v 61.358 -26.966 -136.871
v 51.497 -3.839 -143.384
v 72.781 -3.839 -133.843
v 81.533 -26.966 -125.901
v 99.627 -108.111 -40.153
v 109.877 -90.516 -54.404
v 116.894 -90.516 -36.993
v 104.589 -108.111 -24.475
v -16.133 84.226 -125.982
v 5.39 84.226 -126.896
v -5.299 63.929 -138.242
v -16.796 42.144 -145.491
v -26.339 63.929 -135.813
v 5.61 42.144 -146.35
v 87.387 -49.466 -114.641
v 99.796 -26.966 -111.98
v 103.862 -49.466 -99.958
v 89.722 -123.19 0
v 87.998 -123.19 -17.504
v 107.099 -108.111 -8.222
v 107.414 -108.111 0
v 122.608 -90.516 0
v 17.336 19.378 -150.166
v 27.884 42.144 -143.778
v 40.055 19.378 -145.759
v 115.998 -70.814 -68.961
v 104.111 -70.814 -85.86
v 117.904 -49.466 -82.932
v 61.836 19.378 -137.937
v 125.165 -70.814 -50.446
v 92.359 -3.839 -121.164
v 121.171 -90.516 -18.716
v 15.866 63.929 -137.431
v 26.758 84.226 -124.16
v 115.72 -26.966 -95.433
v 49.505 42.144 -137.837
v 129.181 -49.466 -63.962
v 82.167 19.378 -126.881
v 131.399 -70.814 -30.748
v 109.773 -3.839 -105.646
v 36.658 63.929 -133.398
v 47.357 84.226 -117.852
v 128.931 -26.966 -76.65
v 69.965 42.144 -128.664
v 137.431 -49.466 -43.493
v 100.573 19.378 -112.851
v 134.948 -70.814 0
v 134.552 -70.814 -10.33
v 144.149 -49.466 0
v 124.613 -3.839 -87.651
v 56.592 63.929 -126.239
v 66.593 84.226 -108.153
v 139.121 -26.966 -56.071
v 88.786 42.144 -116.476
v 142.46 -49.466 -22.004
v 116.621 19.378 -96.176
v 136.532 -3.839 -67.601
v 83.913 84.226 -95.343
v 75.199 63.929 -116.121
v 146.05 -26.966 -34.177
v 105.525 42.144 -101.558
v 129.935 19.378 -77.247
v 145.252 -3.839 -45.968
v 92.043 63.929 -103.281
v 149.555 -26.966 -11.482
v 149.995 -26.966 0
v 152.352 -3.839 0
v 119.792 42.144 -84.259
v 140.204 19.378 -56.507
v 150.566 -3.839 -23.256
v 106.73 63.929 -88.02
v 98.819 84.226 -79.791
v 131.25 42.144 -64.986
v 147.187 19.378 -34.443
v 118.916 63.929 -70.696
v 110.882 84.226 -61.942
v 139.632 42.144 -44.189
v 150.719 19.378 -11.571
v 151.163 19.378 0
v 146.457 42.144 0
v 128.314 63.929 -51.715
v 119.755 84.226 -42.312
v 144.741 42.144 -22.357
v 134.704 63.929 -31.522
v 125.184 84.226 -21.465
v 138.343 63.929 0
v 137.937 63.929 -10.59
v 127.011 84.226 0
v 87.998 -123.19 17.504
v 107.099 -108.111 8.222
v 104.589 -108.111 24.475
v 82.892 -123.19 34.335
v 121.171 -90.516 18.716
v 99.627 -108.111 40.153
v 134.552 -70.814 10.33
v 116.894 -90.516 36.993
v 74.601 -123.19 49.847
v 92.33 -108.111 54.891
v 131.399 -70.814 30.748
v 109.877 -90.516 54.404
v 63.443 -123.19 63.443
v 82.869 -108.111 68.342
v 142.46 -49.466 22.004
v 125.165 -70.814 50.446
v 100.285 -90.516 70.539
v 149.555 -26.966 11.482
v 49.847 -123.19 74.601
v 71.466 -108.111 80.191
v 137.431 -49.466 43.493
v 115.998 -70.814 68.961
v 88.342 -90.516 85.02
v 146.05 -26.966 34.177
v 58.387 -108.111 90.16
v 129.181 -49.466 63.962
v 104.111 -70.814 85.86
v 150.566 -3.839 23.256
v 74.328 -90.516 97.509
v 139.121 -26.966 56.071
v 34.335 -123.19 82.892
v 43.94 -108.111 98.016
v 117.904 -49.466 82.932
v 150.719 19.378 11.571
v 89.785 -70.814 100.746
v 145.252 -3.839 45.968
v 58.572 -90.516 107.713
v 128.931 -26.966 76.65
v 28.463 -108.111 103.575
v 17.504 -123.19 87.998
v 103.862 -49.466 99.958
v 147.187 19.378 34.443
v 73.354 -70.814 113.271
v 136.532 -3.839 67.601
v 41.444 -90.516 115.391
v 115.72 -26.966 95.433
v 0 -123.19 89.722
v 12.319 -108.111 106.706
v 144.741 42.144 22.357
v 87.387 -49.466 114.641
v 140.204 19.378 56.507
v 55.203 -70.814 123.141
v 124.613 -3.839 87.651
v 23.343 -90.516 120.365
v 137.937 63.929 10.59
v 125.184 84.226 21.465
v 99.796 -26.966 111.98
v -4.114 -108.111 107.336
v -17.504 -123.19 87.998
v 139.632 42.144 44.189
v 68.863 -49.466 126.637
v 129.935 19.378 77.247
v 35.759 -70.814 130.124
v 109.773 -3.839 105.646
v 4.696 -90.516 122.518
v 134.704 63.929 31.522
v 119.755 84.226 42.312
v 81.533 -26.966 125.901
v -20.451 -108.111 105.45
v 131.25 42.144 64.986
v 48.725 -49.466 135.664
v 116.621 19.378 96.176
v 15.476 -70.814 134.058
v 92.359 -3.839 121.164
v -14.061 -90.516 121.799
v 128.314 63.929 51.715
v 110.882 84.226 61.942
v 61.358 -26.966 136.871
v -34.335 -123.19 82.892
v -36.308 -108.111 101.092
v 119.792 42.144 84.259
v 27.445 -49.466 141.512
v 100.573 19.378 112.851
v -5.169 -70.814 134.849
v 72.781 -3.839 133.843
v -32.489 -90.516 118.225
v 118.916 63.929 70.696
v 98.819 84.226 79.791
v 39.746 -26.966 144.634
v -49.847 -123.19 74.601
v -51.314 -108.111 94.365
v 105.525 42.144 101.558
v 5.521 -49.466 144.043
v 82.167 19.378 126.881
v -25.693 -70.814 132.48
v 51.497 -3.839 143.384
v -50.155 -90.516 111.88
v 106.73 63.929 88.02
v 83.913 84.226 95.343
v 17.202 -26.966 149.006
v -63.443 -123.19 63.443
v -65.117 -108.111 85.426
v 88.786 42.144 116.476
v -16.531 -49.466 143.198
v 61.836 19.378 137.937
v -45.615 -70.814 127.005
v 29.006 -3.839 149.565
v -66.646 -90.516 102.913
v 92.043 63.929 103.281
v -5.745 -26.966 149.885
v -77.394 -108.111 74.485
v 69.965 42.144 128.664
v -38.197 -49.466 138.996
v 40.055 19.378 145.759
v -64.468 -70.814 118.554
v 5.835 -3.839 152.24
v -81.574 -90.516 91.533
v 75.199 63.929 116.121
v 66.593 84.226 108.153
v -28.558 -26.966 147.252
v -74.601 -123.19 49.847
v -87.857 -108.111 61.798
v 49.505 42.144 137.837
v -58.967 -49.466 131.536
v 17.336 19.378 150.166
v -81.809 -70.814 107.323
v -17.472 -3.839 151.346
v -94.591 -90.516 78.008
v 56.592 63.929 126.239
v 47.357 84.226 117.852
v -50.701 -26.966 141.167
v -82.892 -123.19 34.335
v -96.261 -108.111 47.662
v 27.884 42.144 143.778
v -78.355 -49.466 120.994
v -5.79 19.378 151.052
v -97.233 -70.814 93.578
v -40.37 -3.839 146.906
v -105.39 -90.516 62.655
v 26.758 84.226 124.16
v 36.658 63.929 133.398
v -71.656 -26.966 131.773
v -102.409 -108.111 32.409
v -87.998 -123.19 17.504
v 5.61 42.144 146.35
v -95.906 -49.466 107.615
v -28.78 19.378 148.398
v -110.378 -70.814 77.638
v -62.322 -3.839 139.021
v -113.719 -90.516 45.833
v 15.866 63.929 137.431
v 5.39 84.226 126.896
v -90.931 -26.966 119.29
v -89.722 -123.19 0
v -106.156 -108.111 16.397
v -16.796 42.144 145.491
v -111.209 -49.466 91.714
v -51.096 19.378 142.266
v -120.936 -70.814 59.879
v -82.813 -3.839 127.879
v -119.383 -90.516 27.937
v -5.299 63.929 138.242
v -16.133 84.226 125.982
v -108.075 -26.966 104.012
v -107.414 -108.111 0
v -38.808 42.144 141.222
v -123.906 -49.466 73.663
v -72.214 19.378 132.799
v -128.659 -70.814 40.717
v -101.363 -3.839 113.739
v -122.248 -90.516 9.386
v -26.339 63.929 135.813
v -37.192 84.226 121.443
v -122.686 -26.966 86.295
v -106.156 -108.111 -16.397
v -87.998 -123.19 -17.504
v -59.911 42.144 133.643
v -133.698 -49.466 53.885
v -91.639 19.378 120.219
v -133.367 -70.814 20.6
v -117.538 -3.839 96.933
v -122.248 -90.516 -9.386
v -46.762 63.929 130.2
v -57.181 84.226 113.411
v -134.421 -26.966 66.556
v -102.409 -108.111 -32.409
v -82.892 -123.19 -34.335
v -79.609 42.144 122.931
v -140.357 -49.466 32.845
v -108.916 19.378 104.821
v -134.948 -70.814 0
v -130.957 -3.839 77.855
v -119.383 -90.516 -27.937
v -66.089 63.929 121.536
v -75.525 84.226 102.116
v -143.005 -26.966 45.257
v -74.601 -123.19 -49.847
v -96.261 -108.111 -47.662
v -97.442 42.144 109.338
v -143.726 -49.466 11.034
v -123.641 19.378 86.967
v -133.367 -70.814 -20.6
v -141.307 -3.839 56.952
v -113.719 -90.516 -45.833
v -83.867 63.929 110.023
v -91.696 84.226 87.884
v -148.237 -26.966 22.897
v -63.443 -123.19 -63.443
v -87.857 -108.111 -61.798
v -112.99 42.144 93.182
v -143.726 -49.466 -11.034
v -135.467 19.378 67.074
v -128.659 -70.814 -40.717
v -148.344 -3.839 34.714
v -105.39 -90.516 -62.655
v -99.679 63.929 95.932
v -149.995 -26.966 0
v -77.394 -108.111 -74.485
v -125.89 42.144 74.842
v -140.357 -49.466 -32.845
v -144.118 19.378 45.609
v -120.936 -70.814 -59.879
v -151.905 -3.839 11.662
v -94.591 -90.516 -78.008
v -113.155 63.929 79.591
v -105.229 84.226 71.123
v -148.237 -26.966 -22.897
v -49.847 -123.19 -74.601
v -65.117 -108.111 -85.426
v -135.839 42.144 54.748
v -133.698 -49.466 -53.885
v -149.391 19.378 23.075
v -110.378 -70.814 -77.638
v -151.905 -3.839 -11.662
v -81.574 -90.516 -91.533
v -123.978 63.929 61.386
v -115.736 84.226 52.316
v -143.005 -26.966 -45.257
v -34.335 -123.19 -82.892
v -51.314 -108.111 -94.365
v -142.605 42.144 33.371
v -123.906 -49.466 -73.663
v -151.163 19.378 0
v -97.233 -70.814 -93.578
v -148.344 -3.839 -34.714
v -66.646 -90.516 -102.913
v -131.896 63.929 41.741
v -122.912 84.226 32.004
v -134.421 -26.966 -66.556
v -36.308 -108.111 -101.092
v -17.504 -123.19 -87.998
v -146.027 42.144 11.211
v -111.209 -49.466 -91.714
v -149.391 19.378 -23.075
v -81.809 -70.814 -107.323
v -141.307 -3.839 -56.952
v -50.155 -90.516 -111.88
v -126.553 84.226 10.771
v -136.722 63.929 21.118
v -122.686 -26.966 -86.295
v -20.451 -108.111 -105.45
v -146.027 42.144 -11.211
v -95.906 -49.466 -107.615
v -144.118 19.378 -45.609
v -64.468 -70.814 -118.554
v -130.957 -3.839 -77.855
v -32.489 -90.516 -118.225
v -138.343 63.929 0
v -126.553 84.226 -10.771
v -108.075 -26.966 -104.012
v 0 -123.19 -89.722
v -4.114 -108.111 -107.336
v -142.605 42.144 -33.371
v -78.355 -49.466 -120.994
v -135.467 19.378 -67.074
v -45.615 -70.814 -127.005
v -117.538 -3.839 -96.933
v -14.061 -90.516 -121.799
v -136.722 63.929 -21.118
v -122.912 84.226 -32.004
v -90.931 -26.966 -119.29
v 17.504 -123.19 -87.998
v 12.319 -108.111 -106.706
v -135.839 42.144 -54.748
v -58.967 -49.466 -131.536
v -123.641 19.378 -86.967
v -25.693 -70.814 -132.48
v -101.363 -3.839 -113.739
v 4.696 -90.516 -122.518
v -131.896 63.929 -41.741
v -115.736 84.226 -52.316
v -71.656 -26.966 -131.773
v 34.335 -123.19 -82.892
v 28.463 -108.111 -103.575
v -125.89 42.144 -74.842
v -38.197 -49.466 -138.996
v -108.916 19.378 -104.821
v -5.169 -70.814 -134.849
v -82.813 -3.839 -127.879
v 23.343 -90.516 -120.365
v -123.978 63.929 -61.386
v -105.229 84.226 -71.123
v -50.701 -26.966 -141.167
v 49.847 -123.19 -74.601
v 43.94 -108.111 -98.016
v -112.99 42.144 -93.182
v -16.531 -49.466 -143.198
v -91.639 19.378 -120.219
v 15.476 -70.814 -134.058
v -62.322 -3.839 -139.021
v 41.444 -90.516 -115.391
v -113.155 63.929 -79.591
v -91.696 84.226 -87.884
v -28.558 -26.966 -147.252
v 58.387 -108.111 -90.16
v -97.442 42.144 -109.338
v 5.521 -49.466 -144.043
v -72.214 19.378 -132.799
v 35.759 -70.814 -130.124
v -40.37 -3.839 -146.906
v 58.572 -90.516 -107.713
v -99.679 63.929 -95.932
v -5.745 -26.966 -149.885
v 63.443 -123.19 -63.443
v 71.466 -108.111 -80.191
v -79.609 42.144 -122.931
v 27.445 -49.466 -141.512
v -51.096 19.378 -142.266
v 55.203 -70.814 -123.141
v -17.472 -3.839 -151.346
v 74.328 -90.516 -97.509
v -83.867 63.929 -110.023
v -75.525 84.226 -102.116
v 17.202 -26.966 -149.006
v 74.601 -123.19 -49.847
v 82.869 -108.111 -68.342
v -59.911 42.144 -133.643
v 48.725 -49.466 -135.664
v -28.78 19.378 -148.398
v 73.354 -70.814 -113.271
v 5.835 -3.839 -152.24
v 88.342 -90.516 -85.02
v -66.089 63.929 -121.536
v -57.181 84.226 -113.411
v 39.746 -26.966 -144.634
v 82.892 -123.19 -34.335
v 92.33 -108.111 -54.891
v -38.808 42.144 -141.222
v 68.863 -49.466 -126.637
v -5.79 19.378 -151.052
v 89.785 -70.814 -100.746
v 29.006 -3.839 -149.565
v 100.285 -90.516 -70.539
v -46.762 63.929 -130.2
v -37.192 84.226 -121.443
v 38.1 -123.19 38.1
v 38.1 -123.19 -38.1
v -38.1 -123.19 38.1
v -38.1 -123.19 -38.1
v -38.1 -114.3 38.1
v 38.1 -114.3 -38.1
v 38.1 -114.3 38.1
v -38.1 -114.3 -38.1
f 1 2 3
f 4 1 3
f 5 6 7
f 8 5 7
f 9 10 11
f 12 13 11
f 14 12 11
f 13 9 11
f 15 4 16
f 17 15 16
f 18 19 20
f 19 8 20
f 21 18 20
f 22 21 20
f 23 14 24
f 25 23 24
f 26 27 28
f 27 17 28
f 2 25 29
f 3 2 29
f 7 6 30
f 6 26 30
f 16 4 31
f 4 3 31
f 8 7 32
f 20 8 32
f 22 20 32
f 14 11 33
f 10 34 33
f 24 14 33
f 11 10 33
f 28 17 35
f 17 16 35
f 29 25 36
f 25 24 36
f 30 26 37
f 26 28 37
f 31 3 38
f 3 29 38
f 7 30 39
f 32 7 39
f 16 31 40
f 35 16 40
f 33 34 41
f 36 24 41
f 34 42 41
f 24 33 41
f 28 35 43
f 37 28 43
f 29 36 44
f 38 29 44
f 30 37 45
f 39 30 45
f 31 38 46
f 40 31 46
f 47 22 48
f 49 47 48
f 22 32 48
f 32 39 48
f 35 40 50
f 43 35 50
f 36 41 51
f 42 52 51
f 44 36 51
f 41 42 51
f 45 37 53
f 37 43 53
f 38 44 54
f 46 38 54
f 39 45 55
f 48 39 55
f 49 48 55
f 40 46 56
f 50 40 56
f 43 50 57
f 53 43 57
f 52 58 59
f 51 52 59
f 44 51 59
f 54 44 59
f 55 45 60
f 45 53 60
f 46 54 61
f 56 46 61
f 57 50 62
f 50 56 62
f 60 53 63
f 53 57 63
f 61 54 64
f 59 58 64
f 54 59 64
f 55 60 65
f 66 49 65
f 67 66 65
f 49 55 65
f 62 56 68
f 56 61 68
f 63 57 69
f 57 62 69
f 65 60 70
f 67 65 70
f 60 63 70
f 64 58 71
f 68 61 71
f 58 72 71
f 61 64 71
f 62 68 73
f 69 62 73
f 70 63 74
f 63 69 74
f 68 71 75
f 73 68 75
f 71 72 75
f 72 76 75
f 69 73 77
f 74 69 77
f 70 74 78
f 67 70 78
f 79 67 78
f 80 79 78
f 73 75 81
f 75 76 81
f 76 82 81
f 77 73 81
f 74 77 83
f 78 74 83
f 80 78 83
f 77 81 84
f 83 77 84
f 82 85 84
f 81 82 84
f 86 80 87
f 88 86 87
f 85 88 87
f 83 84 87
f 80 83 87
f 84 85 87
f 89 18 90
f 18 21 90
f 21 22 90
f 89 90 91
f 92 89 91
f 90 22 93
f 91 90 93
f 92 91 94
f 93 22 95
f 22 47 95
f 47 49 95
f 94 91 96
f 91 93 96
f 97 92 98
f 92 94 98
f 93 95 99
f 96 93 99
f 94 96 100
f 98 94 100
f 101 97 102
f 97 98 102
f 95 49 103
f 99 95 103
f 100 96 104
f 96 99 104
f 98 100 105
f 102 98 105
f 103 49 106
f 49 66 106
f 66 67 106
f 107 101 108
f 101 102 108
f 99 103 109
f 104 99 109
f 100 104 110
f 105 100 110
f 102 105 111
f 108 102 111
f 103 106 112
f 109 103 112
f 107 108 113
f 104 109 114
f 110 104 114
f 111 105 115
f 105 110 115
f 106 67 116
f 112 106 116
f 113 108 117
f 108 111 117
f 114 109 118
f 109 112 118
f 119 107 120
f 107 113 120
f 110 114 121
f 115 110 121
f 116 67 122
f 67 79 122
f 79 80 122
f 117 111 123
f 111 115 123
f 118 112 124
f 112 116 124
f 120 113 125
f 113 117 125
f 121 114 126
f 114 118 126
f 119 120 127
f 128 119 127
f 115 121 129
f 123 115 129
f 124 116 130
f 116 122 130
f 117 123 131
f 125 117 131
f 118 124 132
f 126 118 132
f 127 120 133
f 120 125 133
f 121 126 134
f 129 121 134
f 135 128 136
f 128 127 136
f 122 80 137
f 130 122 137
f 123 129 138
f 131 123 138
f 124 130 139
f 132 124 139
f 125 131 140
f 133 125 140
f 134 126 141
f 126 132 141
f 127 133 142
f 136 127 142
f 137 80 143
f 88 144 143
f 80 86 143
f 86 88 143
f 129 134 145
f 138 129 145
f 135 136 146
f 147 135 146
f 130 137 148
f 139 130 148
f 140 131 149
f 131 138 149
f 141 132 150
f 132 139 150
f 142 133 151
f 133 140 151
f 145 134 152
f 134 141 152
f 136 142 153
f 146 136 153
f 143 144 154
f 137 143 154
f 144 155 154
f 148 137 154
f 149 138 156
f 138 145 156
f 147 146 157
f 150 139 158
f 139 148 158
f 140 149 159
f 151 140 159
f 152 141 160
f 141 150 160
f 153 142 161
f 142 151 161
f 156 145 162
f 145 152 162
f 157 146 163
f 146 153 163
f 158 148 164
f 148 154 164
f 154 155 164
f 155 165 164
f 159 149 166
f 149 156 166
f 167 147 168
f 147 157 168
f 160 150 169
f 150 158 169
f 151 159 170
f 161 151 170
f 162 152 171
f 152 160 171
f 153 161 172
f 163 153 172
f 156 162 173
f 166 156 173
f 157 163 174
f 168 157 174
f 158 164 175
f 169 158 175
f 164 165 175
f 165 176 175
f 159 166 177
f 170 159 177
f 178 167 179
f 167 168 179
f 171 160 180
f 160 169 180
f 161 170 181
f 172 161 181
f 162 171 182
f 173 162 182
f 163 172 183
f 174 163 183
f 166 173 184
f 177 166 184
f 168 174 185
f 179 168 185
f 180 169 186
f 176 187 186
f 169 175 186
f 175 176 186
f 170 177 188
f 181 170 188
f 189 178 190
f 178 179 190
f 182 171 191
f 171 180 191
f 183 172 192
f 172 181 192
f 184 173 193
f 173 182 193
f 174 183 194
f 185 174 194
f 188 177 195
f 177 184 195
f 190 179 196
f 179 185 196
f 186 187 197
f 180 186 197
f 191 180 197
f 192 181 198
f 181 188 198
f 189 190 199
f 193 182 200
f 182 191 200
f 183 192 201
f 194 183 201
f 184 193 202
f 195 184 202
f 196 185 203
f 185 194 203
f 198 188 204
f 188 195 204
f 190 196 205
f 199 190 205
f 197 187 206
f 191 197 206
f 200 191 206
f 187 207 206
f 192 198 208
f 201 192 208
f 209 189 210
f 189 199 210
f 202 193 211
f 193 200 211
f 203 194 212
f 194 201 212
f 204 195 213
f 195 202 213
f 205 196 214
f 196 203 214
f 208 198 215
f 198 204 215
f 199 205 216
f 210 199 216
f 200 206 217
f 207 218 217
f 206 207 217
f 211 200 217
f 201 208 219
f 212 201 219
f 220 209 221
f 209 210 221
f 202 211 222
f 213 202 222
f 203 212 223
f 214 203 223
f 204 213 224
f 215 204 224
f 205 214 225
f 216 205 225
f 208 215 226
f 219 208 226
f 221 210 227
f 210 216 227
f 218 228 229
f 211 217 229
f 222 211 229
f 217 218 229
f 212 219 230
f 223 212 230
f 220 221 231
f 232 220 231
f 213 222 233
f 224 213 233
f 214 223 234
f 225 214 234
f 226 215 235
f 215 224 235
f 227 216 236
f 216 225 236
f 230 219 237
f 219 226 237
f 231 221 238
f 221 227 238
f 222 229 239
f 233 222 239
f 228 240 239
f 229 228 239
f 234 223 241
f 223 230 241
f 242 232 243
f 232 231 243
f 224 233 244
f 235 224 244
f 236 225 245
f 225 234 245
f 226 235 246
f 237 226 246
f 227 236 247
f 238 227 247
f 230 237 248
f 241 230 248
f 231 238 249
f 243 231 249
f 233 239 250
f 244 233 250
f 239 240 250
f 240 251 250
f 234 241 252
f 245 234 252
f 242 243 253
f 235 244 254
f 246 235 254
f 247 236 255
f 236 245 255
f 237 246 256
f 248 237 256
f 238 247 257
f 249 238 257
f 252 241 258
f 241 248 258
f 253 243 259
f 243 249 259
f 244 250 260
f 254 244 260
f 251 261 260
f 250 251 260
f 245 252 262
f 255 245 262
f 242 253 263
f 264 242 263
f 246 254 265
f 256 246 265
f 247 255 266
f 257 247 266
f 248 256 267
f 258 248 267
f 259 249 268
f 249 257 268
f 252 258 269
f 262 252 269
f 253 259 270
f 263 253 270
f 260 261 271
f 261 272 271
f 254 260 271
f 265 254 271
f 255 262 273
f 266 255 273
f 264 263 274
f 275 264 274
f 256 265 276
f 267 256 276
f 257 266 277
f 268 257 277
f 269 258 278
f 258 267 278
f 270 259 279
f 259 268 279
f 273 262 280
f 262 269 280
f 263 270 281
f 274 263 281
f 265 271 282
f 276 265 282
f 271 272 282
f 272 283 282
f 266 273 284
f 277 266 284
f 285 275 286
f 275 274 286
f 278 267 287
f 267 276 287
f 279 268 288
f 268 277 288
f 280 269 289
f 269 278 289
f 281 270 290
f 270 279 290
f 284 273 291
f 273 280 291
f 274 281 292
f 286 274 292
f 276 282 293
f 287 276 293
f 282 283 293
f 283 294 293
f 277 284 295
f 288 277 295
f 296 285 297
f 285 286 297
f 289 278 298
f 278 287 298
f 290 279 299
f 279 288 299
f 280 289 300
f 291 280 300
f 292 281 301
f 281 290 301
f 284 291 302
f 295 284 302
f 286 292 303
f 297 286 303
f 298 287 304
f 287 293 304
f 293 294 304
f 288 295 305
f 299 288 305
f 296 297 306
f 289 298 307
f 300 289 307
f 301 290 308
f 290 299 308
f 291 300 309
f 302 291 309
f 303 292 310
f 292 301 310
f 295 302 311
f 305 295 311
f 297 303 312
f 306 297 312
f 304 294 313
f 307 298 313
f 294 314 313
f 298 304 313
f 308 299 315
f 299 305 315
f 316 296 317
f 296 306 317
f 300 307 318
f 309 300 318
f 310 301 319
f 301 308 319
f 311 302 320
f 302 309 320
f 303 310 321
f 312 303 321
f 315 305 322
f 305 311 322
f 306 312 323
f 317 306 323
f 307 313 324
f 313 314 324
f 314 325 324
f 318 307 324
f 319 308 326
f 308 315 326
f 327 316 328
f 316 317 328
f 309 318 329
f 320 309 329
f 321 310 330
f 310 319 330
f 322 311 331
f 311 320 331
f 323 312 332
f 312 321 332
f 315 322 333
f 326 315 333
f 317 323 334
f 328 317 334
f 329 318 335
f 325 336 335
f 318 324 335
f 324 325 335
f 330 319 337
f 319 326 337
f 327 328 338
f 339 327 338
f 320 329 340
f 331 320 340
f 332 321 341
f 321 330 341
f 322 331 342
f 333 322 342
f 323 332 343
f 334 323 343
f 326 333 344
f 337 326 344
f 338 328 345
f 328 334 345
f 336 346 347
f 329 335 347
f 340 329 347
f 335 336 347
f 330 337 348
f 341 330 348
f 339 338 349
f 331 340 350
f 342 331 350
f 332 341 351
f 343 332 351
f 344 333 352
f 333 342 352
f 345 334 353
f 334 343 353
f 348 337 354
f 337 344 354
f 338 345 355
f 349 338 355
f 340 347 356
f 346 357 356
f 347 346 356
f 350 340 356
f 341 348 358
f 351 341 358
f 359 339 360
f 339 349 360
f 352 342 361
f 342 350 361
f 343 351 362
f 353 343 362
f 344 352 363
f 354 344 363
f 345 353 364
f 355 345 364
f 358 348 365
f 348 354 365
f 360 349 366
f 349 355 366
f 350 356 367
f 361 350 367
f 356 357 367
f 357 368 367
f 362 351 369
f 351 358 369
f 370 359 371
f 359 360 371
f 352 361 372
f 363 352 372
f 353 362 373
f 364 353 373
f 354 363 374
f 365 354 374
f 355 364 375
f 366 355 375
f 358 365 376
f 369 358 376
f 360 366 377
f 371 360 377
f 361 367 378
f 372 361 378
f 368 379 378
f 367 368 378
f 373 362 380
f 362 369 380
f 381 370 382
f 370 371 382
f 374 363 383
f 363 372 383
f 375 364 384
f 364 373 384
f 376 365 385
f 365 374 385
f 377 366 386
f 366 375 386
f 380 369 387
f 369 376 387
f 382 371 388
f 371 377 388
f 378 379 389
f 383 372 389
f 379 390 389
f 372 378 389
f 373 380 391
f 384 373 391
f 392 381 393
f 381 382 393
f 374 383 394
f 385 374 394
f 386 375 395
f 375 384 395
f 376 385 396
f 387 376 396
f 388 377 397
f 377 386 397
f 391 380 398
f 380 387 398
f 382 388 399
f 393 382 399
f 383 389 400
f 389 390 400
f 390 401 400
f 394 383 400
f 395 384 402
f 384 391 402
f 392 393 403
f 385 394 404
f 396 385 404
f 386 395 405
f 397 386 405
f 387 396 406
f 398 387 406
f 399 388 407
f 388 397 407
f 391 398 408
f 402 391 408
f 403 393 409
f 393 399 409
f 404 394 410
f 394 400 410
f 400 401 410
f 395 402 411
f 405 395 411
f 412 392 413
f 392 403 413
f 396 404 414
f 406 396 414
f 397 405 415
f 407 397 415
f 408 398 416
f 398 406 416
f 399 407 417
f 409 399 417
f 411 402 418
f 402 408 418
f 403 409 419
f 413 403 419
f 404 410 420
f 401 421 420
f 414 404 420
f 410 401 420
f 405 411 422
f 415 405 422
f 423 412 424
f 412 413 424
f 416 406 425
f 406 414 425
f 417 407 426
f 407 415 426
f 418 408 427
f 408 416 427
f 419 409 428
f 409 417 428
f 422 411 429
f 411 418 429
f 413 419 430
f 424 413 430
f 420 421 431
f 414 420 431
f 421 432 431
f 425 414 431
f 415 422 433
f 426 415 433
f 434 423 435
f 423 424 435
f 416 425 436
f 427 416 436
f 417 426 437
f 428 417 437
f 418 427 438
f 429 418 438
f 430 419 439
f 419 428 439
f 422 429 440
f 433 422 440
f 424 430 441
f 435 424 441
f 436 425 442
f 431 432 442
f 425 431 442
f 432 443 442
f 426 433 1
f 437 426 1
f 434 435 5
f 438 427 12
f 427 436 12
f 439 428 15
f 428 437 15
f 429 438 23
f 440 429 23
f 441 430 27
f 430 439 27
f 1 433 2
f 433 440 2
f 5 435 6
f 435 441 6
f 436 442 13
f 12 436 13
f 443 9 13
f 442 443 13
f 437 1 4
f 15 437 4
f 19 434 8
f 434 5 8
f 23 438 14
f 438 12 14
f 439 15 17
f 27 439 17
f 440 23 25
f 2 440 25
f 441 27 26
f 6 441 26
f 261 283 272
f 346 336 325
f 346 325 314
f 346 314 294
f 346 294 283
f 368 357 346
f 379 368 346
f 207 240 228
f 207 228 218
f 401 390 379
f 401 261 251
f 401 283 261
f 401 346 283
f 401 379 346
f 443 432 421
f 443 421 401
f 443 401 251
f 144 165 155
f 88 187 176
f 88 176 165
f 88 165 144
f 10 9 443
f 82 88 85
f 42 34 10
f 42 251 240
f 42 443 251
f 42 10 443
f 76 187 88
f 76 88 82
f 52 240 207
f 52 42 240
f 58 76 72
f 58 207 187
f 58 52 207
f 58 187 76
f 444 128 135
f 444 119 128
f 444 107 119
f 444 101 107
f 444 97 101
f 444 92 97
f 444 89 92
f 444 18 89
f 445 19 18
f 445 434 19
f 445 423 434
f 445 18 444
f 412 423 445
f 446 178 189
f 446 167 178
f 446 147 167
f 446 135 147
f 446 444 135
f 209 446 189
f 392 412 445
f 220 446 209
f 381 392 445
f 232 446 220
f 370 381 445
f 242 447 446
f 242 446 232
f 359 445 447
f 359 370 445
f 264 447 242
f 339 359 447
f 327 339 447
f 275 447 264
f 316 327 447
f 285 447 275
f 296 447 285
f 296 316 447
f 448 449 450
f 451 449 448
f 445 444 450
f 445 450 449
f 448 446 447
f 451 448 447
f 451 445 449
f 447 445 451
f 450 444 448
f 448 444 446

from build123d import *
from OCP.BRepAlgoAPI import BRepAlgoAPI_Cut
from OCP.TopTools import TopTools_ListOfShape

# Parameters (mm, degrees)
SKETCH2_W          = 408.49124402
SKETCH2_H          = 323.52250017
CUT_EXTRUDE1_DEPTH = 68.1736
SKETCH3_W          = 76.2
SKETCH3_H          = 76.2
CUT_EXTRUDE2_DEPTH = 38.1
SKETCH5_W          = 393.276963666
SKETCH5_H          = 361.967680156
CUT_EXTRUDE4_DEPTH = 29.21


with BuildPart() as part:
    # Sketch1 → Revolve1 (revolve)
    with BuildSketch(Plane.XY):
        with BuildLine():
            Line((0, 152.4), (0, -152.4))
            ThreePointArc((0, -152.4), (152.4, 0), (0, 152.4))
        make_face()
    revolve(axis=Axis((0, 152.4, 0), (0, -1, 0)))

    # Sketch2 → Cut-Extrude1 (cut)
    with BuildSketch(Plane(origin=(0, 152.4, 0), x_dir=(1, 0, 0), z_dir=(0, 1, 0))):
        Rectangle(SKETCH2_W, SKETCH2_H)
    extrude(amount=-CUT_EXTRUDE1_DEPTH, mode=Mode.SUBTRACT)


with BuildPart() as cut_extrude2_tool:
    # Sketch3 → Cut-Extrude2 (new body)
    with BuildSketch(Plane(origin=(0, -152.4, 0), x_dir=(-1, 0, 0), z_dir=(0, -1, 0))):
        Rectangle(SKETCH3_W, SKETCH3_H)
    extrude(amount=-CUT_EXTRUDE2_DEPTH)


with BuildPart() as part_1:
    add(part.part)

    # Cut-Extrude2: cut by cut_extrude2_tool, with a tolerance
    cut_extrude2_stock = TopTools_ListOfShape()
    cut_extrude2_stock.Append(part_1.part.wrapped)
    cut_extrude2_tools = TopTools_ListOfShape()
    cut_extrude2_tools.Append(cut_extrude2_tool.part.wrapped)
    cut_extrude2_cut = BRepAlgoAPI_Cut()
    cut_extrude2_cut.SetArguments(cut_extrude2_stock)
    cut_extrude2_cut.SetTools(cut_extrude2_tools)
    cut_extrude2_cut.SetFuzzyValue(0.00001)
    cut_extrude2_cut.Build()
    add(Compound.cast(cut_extrude2_cut.Shape()).solids(), mode=Mode.REPLACE)

    # Sketch5 → Cut-Extrude4 (cut)
    with BuildSketch(Plane(origin=(0, -152.4, 0), x_dir=(-1, 0, 0), z_dir=(0, -1, 0))):
        Rectangle(SKETCH5_W, SKETCH5_H)
    extrude(amount=-CUT_EXTRUDE4_DEPTH, mode=Mode.SUBTRACT)


solid = part_1.part
